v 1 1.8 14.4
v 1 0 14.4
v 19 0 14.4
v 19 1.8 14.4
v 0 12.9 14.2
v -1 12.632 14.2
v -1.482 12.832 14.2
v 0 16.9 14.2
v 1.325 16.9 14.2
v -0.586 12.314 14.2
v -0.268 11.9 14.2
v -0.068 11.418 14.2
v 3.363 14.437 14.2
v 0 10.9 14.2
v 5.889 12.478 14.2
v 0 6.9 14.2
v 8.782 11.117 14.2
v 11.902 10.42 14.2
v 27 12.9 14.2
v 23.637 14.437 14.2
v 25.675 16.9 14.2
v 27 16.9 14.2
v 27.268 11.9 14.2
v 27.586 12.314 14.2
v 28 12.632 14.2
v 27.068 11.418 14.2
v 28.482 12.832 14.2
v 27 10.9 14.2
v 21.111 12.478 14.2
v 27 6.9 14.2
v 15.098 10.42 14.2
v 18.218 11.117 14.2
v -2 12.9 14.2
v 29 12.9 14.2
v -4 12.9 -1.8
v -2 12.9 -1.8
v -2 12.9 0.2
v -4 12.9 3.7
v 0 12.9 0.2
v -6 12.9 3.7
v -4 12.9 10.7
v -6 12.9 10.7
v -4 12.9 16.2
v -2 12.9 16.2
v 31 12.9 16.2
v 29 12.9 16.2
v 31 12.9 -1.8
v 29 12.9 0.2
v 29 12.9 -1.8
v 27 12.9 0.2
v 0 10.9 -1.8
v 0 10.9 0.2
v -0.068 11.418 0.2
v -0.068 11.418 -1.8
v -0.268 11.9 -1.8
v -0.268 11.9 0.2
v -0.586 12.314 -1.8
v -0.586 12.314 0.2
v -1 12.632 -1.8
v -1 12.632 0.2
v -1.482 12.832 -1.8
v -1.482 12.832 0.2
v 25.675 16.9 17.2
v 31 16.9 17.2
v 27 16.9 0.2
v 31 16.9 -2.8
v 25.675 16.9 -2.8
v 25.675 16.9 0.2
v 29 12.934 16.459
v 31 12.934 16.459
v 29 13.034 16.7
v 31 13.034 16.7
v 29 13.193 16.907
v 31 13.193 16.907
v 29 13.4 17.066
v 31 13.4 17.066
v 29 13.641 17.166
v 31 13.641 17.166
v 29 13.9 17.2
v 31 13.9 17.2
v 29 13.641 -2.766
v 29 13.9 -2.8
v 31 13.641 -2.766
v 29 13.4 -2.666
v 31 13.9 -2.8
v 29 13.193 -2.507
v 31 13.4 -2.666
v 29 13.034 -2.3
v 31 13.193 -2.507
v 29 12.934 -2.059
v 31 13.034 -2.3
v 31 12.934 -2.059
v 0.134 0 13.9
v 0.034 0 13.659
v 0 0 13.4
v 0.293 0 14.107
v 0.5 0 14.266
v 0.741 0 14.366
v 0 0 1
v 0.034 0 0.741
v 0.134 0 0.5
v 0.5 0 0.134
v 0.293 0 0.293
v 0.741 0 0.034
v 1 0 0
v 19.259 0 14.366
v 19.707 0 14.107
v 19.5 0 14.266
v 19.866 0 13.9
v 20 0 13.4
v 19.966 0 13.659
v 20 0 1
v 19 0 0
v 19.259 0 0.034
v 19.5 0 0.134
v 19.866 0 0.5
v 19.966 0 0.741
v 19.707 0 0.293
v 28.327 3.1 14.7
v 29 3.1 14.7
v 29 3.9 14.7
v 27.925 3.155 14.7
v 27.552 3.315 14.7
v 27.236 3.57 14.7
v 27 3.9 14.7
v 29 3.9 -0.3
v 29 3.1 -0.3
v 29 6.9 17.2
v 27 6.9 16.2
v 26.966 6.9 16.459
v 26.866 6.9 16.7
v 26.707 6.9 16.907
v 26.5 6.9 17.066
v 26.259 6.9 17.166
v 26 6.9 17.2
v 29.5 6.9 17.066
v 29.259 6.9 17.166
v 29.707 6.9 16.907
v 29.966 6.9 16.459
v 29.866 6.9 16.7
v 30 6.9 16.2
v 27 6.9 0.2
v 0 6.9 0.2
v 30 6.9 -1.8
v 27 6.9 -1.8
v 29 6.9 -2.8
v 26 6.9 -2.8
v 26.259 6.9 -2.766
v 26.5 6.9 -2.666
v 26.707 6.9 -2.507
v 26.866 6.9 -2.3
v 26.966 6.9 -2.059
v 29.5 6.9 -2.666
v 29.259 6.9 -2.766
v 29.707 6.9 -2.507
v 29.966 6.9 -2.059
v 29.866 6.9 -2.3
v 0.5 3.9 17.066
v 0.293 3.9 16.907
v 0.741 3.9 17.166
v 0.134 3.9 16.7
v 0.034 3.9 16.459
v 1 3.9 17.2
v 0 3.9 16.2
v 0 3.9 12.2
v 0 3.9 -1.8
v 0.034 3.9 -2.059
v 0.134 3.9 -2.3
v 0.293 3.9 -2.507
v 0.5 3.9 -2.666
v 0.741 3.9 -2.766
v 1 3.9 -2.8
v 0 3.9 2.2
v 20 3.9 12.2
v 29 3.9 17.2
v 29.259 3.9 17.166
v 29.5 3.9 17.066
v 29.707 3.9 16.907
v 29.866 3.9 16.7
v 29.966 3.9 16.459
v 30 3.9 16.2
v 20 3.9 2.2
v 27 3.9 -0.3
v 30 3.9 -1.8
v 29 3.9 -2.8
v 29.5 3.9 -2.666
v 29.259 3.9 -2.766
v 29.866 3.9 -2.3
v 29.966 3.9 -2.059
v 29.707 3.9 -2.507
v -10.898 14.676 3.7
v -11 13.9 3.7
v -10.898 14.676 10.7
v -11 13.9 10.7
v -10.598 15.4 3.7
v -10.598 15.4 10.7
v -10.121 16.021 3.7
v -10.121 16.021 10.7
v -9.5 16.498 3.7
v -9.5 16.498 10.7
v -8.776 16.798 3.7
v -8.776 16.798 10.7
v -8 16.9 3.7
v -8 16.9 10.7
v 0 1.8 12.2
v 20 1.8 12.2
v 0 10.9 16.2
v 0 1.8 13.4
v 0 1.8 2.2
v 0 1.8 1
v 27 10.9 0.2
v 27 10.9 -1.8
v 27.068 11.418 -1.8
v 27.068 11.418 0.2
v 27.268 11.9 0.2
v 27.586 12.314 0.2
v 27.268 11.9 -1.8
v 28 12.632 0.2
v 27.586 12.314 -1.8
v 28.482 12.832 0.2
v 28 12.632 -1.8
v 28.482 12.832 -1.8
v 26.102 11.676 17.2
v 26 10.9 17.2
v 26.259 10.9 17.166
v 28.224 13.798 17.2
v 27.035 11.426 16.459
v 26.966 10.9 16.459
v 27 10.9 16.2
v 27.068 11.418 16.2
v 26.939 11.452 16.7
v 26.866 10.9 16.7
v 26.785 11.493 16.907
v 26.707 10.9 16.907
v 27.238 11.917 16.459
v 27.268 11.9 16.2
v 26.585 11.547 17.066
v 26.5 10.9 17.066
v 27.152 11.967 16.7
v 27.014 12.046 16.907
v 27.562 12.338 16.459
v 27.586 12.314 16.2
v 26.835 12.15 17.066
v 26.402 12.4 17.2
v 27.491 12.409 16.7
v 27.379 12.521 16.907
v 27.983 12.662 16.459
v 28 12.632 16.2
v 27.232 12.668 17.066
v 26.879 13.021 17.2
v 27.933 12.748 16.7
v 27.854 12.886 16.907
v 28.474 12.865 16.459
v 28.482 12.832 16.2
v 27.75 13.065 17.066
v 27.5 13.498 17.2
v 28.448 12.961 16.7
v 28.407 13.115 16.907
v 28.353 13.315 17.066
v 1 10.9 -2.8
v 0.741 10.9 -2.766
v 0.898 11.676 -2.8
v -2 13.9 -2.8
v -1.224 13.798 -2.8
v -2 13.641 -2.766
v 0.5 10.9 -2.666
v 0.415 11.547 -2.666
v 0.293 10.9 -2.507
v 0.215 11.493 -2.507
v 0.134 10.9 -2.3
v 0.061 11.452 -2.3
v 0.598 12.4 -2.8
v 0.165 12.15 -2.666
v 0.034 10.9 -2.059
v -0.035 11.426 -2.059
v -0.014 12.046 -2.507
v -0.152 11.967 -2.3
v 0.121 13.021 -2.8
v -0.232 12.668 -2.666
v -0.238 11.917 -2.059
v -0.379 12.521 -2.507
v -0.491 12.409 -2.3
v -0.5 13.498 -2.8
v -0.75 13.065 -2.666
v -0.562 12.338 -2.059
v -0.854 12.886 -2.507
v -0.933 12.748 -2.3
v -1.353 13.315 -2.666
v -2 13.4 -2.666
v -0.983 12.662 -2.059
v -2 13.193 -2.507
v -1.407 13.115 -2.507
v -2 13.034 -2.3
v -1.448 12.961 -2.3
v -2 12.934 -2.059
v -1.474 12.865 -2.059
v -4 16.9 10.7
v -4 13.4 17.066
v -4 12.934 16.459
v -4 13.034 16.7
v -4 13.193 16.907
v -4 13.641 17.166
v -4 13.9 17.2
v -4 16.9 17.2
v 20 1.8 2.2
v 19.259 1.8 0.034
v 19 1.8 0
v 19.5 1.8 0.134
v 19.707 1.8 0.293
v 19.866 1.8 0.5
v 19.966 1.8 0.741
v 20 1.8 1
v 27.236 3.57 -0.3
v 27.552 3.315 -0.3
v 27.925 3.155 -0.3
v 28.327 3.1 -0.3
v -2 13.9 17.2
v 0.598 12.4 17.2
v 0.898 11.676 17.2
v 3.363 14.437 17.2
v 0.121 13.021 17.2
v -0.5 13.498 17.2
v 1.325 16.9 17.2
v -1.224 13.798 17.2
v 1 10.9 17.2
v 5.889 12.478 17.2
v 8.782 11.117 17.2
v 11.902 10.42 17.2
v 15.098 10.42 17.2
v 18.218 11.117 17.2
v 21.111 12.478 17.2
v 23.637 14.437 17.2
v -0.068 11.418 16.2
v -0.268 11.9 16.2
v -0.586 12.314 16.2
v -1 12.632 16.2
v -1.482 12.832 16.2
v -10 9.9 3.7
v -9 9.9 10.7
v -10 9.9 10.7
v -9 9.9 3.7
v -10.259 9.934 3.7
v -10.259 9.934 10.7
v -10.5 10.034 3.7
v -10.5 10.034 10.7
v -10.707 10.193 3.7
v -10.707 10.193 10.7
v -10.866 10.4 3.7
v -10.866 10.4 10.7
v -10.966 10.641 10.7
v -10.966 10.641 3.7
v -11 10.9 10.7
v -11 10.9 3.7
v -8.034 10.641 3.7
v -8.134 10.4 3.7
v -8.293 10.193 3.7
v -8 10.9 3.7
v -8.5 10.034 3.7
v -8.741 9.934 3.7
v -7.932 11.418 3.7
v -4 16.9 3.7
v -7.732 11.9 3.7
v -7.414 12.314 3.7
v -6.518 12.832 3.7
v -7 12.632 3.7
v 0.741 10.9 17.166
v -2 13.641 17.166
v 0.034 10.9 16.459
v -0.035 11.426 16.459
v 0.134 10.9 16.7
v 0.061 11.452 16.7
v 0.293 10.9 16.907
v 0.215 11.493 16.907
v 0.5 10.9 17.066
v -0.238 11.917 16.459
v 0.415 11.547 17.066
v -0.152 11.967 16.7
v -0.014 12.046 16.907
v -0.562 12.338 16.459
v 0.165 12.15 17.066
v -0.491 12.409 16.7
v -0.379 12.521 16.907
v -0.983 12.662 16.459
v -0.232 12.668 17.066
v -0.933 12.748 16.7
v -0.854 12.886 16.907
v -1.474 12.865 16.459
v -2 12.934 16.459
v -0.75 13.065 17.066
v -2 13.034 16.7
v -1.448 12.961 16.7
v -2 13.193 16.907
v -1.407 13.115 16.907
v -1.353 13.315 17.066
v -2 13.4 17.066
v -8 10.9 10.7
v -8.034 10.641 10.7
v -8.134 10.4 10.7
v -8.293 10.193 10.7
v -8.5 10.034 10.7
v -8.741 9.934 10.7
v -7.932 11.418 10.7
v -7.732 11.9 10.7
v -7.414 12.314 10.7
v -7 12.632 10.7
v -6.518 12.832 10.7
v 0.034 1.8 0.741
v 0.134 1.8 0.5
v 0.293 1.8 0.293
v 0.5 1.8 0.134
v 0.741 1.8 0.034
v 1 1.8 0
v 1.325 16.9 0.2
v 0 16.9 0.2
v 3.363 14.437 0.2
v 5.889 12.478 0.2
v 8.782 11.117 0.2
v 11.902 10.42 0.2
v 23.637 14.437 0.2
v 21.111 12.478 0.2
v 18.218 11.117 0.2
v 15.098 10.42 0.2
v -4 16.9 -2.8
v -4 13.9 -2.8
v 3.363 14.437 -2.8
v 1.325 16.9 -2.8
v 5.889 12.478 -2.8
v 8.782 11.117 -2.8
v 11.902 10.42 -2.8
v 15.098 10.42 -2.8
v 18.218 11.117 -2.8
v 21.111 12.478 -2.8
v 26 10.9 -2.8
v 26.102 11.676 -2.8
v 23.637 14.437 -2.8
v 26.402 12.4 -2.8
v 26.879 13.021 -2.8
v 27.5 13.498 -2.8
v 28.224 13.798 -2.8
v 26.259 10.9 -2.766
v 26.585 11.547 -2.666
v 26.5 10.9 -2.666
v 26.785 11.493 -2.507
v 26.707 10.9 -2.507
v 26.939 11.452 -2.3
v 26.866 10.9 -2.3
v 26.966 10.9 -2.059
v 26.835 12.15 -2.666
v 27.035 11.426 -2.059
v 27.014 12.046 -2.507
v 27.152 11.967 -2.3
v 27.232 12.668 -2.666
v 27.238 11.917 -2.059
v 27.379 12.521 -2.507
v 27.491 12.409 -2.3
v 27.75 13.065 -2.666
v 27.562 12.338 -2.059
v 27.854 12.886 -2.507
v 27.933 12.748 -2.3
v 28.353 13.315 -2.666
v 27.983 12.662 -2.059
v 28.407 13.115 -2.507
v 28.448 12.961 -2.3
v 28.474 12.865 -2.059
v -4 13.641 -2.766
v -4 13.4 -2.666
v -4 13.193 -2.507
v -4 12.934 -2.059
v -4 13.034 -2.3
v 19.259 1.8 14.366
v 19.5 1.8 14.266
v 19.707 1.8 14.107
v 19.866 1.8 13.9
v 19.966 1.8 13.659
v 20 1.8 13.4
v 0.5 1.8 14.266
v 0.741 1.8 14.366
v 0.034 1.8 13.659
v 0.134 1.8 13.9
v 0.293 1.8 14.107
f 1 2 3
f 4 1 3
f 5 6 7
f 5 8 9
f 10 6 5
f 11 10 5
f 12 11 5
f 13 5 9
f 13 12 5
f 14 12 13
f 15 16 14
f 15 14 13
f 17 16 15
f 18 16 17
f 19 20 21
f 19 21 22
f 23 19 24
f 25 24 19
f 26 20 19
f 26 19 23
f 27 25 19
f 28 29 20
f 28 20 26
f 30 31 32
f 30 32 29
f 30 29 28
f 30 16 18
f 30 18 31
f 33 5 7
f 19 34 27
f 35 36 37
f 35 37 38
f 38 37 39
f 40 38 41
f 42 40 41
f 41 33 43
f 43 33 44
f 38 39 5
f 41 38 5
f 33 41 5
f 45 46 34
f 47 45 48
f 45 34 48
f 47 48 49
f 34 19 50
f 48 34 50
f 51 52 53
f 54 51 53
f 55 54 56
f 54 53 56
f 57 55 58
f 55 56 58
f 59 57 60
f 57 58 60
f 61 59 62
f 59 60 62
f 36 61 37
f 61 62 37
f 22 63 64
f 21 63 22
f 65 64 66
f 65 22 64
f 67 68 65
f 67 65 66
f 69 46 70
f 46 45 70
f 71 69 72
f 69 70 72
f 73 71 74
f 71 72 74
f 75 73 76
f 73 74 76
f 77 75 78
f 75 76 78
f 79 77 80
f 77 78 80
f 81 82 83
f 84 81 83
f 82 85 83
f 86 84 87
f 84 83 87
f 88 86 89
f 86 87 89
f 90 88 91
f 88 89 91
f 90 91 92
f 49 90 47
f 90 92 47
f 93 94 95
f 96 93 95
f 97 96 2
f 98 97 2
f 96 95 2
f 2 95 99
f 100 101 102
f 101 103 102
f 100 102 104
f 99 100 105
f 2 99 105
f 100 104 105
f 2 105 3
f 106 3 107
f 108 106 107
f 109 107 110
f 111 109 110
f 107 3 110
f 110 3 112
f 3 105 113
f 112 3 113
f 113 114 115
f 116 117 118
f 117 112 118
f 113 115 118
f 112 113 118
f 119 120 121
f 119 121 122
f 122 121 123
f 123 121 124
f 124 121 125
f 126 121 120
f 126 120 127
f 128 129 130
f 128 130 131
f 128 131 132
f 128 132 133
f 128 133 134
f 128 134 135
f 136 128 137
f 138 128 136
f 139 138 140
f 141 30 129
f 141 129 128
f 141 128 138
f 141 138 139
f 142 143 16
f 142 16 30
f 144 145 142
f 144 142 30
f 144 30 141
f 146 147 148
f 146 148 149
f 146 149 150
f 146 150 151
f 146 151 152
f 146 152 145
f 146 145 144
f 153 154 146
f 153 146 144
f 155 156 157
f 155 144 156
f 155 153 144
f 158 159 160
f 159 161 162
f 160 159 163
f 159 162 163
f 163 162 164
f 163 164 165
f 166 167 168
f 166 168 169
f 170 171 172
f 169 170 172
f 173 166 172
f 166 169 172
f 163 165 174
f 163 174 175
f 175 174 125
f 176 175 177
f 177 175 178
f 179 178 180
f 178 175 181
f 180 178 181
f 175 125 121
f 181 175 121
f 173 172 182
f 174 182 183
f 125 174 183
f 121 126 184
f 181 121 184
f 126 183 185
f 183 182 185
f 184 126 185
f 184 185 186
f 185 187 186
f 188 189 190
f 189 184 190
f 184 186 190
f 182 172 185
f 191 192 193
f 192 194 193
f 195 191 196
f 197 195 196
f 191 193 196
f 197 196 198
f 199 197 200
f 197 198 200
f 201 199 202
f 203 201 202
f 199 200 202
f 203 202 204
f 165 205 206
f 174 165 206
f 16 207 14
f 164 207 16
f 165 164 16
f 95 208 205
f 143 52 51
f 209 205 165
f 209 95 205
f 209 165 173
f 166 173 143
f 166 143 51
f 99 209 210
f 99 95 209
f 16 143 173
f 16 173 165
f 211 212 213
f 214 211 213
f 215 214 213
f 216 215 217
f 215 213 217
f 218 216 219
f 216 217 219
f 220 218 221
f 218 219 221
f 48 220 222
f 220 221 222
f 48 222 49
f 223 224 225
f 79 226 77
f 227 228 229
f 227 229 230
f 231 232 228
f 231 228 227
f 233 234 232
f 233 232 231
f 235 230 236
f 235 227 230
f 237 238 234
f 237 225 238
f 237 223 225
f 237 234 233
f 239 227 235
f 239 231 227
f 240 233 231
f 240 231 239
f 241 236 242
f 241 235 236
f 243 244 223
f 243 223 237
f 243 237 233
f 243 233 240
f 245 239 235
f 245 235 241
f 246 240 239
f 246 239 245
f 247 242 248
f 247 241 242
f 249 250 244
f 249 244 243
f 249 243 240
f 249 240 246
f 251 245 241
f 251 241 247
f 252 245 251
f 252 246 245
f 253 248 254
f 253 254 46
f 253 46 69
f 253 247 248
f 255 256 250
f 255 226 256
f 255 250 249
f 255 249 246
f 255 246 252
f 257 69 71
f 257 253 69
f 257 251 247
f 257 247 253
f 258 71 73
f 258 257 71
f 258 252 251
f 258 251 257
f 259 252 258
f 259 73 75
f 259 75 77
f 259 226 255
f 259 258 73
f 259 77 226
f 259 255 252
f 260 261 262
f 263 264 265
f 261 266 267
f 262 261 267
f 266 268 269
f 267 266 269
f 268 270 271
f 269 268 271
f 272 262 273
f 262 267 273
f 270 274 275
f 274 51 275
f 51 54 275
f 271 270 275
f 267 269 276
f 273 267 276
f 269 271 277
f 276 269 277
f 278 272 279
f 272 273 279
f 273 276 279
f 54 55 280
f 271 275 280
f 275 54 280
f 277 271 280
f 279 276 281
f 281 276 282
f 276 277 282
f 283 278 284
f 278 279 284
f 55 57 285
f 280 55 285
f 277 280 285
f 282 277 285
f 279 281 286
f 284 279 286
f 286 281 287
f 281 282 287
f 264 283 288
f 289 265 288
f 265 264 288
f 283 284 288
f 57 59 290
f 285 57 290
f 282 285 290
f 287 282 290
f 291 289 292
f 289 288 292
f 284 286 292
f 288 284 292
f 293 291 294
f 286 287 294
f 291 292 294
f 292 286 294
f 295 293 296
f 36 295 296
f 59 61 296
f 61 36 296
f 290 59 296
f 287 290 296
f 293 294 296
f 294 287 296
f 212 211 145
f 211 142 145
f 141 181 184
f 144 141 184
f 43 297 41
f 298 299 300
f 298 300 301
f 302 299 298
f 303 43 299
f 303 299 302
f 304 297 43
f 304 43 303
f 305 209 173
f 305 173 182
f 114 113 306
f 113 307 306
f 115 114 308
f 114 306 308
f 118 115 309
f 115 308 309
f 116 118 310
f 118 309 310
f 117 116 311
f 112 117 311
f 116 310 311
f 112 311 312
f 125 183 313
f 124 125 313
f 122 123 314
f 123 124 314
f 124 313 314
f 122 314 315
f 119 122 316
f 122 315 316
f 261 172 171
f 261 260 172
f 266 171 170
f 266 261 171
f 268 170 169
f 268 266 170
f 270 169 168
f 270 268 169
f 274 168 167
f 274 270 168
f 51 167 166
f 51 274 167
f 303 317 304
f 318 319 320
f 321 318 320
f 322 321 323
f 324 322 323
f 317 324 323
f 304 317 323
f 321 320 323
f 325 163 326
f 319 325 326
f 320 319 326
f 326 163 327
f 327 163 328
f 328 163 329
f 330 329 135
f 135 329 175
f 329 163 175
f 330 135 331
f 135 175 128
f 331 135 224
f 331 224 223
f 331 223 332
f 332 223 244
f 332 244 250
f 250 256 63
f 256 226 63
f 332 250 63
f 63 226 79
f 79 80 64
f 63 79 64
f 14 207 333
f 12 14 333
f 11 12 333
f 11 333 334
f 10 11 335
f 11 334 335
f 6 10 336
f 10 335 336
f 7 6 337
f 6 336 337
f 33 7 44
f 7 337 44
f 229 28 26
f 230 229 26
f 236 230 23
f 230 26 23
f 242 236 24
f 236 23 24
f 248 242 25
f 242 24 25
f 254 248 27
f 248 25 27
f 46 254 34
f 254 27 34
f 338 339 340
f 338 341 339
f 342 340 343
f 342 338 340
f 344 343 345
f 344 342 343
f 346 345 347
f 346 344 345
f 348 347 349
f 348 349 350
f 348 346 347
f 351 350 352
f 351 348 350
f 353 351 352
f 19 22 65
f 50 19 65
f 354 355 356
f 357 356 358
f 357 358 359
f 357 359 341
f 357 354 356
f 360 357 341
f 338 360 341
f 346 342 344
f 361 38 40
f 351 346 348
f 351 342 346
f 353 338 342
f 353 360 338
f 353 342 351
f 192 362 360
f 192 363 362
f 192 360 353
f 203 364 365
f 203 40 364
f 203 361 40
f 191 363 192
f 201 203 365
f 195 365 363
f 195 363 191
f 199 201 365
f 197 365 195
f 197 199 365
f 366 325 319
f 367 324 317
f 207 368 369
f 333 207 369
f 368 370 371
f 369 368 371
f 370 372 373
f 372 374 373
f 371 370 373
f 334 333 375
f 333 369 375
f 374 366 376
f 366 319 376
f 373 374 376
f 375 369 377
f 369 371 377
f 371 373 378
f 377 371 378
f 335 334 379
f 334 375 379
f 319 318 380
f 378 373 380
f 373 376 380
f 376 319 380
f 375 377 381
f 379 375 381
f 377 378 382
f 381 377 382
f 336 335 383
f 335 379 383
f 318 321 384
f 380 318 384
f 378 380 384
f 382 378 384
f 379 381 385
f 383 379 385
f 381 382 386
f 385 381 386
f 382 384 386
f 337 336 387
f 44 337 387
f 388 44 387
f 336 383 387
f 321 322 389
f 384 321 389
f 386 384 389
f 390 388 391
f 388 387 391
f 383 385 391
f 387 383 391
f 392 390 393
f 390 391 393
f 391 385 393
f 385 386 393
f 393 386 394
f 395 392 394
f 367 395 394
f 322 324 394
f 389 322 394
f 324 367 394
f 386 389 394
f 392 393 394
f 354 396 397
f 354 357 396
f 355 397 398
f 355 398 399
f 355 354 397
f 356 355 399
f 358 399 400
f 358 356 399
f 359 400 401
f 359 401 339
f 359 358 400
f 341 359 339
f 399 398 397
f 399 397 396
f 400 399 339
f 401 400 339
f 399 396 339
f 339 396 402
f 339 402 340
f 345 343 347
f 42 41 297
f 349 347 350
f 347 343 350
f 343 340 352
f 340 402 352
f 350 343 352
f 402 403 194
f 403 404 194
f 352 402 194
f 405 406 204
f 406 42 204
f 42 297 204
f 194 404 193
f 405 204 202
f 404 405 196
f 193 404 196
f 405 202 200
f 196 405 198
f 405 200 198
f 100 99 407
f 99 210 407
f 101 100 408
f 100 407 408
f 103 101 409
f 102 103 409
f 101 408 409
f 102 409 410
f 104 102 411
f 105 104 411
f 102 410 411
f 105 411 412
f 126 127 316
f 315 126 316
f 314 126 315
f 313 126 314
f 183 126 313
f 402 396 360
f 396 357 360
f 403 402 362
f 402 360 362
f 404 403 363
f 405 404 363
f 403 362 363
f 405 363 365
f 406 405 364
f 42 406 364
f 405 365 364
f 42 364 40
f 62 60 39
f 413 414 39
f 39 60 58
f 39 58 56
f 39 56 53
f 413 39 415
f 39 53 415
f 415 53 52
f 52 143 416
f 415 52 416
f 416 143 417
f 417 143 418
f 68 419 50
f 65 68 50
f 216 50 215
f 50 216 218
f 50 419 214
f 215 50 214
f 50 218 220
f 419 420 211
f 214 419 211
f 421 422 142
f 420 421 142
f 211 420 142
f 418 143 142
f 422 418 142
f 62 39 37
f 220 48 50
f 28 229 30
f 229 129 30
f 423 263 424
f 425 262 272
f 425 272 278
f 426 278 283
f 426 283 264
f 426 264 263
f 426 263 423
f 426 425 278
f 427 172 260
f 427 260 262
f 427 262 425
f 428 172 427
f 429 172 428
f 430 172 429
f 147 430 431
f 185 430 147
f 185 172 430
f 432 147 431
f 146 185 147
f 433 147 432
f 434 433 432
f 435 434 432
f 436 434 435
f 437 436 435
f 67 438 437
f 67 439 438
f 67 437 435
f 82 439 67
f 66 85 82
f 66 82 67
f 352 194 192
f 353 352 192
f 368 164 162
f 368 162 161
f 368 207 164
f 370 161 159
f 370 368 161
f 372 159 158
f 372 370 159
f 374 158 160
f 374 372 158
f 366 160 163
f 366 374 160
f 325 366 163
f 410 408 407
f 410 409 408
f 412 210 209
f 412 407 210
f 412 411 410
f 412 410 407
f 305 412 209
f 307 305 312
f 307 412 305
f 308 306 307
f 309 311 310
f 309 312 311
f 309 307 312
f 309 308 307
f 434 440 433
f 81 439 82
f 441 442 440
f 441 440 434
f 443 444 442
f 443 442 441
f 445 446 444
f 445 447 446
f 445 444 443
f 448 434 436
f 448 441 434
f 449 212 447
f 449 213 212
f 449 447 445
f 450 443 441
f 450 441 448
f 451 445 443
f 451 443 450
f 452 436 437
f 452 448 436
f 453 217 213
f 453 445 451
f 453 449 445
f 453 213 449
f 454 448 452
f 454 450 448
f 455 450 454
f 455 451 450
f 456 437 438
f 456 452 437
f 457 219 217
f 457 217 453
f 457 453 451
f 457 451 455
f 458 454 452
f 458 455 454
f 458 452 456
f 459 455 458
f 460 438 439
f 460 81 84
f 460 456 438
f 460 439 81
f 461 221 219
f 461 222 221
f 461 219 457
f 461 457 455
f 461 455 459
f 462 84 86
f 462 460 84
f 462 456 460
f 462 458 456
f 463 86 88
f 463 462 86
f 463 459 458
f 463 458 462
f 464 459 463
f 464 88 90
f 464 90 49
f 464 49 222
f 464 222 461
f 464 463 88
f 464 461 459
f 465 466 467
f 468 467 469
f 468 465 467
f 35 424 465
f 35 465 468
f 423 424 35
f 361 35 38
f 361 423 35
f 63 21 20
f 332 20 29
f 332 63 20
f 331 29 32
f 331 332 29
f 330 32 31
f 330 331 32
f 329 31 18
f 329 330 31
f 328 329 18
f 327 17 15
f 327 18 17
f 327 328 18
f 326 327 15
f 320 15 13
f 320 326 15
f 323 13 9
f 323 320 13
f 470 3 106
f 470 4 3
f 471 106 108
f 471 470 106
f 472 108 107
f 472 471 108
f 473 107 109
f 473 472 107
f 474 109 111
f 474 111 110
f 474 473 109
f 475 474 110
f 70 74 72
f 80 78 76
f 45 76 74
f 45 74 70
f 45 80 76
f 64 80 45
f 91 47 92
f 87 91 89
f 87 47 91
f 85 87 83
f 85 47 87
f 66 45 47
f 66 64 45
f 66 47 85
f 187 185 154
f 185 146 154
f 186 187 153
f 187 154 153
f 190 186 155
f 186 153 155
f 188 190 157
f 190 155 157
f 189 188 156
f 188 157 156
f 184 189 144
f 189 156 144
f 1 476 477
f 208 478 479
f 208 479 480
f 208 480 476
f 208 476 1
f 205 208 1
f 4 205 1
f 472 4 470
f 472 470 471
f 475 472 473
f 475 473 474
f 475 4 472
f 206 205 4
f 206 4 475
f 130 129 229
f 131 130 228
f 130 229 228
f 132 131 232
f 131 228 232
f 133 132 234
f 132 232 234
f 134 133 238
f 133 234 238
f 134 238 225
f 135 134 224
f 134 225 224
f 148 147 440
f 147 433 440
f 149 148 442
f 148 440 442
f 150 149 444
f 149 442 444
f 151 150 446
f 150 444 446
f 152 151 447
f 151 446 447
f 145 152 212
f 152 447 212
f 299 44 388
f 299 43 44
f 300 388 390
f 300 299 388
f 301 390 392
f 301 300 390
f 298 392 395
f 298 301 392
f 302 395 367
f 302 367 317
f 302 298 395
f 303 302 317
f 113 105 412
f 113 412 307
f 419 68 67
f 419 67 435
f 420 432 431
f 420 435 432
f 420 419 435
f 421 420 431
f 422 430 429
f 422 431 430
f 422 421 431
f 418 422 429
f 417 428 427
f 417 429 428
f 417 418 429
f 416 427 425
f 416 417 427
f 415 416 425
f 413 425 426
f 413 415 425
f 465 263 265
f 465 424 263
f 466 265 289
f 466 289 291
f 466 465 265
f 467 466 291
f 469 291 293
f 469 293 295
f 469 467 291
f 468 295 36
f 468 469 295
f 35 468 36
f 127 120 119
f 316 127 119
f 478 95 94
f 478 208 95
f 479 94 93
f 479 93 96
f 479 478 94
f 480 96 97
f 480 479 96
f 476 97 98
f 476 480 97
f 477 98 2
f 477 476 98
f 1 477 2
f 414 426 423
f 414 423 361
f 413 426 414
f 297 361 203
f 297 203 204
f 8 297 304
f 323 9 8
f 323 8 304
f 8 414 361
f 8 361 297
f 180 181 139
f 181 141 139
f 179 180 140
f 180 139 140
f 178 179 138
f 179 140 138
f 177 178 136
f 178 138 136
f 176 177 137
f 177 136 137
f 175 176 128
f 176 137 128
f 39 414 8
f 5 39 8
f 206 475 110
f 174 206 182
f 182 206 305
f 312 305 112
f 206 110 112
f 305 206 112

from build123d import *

# Parameters (mm, degrees)
SKETCH1_W            = 20
SKETCH1_H            = 14.4
BOSS_EXTRUDE1_DEPTH  = 1.8
SKETCH2_W            = 20
SKETCH2_H            = 10
BOSS_EXTRUDE2_DEPTH  = 2.1
SKETCH3_W            = 30
SKETCH3_H            = 20
BOSS_EXTRUDE3_DEPTH  = 3
SKETCH4_W            = 2
SKETCH4_H            = 15
BOSS_EXTRUDE4_DEPTH  = 0.8
FILLET1_R            = 1.5
SKETCH5_W            = 27
SKETCH5_H            = 3
BOSS_EXTRUDE6_DEPTH  = 10
CUT_EXTRUDE1_DEPTH   = 40.819718733
SKETCH7_W            = 20
SKETCH7_H            = 4
BOSS_EXTRUDE7_DEPTH  = 4
SKETCH8_W            = 20
SKETCH8_H            = 4
BOSS_EXTRUDE8_DEPTH  = 4
FILLET3_R            = 2
FILLET2_R            = 1
FILLET4_R            = 1
SKETCH10_W           = 7
SKETCH10_H           = 4
BOSS_EXTRUDE10_DEPTH = 7
SKETCH11_W           = 3
SKETCH11_H           = 7
BOSS_EXTRUDE11_DEPTH = 3
FILLET5_R            = 2
FILLET6_R            = 1
FILLET7_R            = 3


# Some blends are built 0.0001 mm under size
with BuildPart() as part:
    # Sketch1 → Boss-Extrude1 (new body)
    with BuildSketch(Plane(origin=(0, 0, 0), x_dir=(1, 0, 0), z_dir=(0, 1, 0))):
        with Locations((10, -7.2)):
            Rectangle(SKETCH1_W, SKETCH1_H)
    extrude(amount=BOSS_EXTRUDE1_DEPTH)

    # Sketch2 → Boss-Extrude2 (add)
    with BuildSketch(Plane(origin=(0, 1.8, 0), x_dir=(1, 0, 0), z_dir=(0, 1, 0))):
        with Locations((10, -7.2)):
            Rectangle(SKETCH2_W, SKETCH2_H)
    extrude(amount=BOSS_EXTRUDE2_DEPTH)

    # Sketch3 → Boss-Extrude3 (add)
    with BuildSketch(Plane(origin=(0, 3.9, 0), x_dir=(1, 0, 0), z_dir=(0, 1, 0))):
        with Locations((15, -7.2)):
            Rectangle(SKETCH3_W, SKETCH3_H)
    extrude(amount=BOSS_EXTRUDE3_DEPTH)

    # Sketch4 → Boss-Extrude4 (add)
    with BuildSketch(Plane(origin=(0, 3.9, 0), x_dir=(-1, 0, 0), z_dir=(0, -1, 0))):
        with Locations((-28, -7.2)):
            Rectangle(SKETCH4_W, SKETCH4_H)
    extrude(amount=BOSS_EXTRUDE4_DEPTH)

    # Fillet1
    # the kernel refuses this fillet: 1.5 mm, written as the material it takes off along each edge
    with BuildSketch(Plane(origin=(27, 3.1, -3.61662479), x_dir=(0, 1, 0), z_dir=(0, 0, 1))) as fillet1_piece_1:
        with BuildLine():
            CenterArc((1.5, -1.326649916), FILLET1_R, 117.818139285, 62.181860715)
            Line((0, -1.326649916), (-0.03, -1.326649916))
            Line((-0.03, -1.326649916), (-0.03, 0))
            Line((-0.03, 0), (0, 0.03))
            ThreePointArc((0, 0.03), (0.4, 0.03), (0.786, 0.026532998))
            Line((0.786, 0.026532998), (0.8, 0))
        make_face()
    extrude(amount=21.633249581, mode=Mode.SUBTRACT)

    # Sketch5 → Boss-Extrude6 (add)
    with BuildSketch(Plane(origin=(0, 6.9, 0), x_dir=(1, 0, 0), z_dir=(0, 1, 0))):
        with Locations((13.5, 1.3)):
            Rectangle(SKETCH5_W, SKETCH5_H)
        with Locations((13.5, -15.7)):
            Rectangle(SKETCH5_W, SKETCH5_H)
    extrude(amount=BOSS_EXTRUDE6_DEPTH)

    # Sketch6 → Cut-Extrude1 (cut, through all)
    with BuildSketch(Plane.XY.offset(17.2)):
        with BuildLine():
            Line((1.325139576, 16.9), (25.674860424, 16.9))
            ThreePointArc((25.674860424, 16.9), (13.5, 10.331979326), (1.325139576, 16.9))
        make_face()
    extrude(amount=-CUT_EXTRUDE1_DEPTH, mode=Mode.SUBTRACT)

    # Sketch7 → Boss-Extrude7 (add)
    with BuildSketch(Plane(origin=(27, 0, 0), x_dir=(0, 0, -1), z_dir=(1, 0, 0))):
        with Locations((-7.2, 14.9)):
            Rectangle(SKETCH7_W, SKETCH7_H)
    extrude(amount=BOSS_EXTRUDE7_DEPTH)

    # Sketch8 → Boss-Extrude8 (add)
    with BuildSketch(Plane.ZY):
        with Locations((7.2, 14.9)):
            Rectangle(SKETCH8_W, SKETCH8_H)
    extrude(amount=BOSS_EXTRUDE8_DEPTH)

    # Fillet3
    fillet3_edges = [part.edges().sort_by_distance(p)[0] for p in [
        (27, 12.9, 15.7),
        (27, 12.9, -1.3),
        (0, 12.9, 15.7),
        (0, 12.9, -1.3),
    ]]
    fillet(fillet3_edges, radius=FILLET3_R)

    # Fillet2
    fillet2_edges = [part.edges().sort_by_distance(p)[0] for p in [
        (-3, 12.9, -2.8),
        (-3, 12.9, 17.2),
        (0, 7.4, -2.8),
        (0, 7.4, 17.2),
        (-0.585786438, 12.314213562, 17.2),
        (-0.585786438, 12.314213562, -2.8),
        (30, 5.4, 17.2),
        (30, 5.4, -2.8),
        (0, 0.9, 0),
        (20, 0.9, 0),
        (20, 0.9, 14.4),
        (0, 0.9, 14.4),
    ]]
    fillet(fillet2_edges, radius=FILLET2_R)

    # Fillet4
    fillet4_edges = [part.edges().sort_by_distance(p)[0] for p in [
        (30, 12.9, 17.2),
        (30, 12.9, -2.8),
        (27, 8.9, -2.8),
        (27, 8.9, 17.2),
        (27.585786438, 12.314213562, -2.8),
        (27.585786438, 12.314213562, 17.2),
    ]]
    fillet(fillet4_edges, radius=FILLET4_R)

    # Sketch10 → Boss-Extrude10 (add)
    with BuildSketch(Plane.ZY.offset(4)):
        with Locations((7.2, 14.9)):
            Rectangle(SKETCH10_W, SKETCH10_H)
    extrude(amount=BOSS_EXTRUDE10_DEPTH)

    # Sketch11 → Boss-Extrude11 (add)
    with BuildSketch(Plane(origin=(0, 12.9, 0), x_dir=(-1, 0, 0), z_dir=(0, -1, 0))):
        with Locations((9.5, -7.2)):
            Rectangle(SKETCH11_W, SKETCH11_H)
    extrude(amount=BOSS_EXTRUDE11_DEPTH)

    # Fillet5
    fillet5_edges = [part.edges().sort_by_distance(p)[0] for p in [
        (-8, 12.9, 7.2),
    ]]
    fillet(fillet5_edges, radius=FILLET5_R)

    # Fillet6
    fillet6_edges = [part.edges().sort_by_distance(p)[0] for p in [
        (-11, 9.9, 7.2),
        (-8, 9.9, 7.2),
    ]]
    fillet(fillet6_edges, radius=FILLET6_R - 0.0001)  # a hair under: the kernel refuses the full size

    # Fillet7
    fillet7_edges = [part.edges().sort_by_distance(p)[0] for p in [
        (-11, 16.9, 7.2),
    ]]
    fillet(fillet7_edges, radius=FILLET7_R)


solid = part.part
